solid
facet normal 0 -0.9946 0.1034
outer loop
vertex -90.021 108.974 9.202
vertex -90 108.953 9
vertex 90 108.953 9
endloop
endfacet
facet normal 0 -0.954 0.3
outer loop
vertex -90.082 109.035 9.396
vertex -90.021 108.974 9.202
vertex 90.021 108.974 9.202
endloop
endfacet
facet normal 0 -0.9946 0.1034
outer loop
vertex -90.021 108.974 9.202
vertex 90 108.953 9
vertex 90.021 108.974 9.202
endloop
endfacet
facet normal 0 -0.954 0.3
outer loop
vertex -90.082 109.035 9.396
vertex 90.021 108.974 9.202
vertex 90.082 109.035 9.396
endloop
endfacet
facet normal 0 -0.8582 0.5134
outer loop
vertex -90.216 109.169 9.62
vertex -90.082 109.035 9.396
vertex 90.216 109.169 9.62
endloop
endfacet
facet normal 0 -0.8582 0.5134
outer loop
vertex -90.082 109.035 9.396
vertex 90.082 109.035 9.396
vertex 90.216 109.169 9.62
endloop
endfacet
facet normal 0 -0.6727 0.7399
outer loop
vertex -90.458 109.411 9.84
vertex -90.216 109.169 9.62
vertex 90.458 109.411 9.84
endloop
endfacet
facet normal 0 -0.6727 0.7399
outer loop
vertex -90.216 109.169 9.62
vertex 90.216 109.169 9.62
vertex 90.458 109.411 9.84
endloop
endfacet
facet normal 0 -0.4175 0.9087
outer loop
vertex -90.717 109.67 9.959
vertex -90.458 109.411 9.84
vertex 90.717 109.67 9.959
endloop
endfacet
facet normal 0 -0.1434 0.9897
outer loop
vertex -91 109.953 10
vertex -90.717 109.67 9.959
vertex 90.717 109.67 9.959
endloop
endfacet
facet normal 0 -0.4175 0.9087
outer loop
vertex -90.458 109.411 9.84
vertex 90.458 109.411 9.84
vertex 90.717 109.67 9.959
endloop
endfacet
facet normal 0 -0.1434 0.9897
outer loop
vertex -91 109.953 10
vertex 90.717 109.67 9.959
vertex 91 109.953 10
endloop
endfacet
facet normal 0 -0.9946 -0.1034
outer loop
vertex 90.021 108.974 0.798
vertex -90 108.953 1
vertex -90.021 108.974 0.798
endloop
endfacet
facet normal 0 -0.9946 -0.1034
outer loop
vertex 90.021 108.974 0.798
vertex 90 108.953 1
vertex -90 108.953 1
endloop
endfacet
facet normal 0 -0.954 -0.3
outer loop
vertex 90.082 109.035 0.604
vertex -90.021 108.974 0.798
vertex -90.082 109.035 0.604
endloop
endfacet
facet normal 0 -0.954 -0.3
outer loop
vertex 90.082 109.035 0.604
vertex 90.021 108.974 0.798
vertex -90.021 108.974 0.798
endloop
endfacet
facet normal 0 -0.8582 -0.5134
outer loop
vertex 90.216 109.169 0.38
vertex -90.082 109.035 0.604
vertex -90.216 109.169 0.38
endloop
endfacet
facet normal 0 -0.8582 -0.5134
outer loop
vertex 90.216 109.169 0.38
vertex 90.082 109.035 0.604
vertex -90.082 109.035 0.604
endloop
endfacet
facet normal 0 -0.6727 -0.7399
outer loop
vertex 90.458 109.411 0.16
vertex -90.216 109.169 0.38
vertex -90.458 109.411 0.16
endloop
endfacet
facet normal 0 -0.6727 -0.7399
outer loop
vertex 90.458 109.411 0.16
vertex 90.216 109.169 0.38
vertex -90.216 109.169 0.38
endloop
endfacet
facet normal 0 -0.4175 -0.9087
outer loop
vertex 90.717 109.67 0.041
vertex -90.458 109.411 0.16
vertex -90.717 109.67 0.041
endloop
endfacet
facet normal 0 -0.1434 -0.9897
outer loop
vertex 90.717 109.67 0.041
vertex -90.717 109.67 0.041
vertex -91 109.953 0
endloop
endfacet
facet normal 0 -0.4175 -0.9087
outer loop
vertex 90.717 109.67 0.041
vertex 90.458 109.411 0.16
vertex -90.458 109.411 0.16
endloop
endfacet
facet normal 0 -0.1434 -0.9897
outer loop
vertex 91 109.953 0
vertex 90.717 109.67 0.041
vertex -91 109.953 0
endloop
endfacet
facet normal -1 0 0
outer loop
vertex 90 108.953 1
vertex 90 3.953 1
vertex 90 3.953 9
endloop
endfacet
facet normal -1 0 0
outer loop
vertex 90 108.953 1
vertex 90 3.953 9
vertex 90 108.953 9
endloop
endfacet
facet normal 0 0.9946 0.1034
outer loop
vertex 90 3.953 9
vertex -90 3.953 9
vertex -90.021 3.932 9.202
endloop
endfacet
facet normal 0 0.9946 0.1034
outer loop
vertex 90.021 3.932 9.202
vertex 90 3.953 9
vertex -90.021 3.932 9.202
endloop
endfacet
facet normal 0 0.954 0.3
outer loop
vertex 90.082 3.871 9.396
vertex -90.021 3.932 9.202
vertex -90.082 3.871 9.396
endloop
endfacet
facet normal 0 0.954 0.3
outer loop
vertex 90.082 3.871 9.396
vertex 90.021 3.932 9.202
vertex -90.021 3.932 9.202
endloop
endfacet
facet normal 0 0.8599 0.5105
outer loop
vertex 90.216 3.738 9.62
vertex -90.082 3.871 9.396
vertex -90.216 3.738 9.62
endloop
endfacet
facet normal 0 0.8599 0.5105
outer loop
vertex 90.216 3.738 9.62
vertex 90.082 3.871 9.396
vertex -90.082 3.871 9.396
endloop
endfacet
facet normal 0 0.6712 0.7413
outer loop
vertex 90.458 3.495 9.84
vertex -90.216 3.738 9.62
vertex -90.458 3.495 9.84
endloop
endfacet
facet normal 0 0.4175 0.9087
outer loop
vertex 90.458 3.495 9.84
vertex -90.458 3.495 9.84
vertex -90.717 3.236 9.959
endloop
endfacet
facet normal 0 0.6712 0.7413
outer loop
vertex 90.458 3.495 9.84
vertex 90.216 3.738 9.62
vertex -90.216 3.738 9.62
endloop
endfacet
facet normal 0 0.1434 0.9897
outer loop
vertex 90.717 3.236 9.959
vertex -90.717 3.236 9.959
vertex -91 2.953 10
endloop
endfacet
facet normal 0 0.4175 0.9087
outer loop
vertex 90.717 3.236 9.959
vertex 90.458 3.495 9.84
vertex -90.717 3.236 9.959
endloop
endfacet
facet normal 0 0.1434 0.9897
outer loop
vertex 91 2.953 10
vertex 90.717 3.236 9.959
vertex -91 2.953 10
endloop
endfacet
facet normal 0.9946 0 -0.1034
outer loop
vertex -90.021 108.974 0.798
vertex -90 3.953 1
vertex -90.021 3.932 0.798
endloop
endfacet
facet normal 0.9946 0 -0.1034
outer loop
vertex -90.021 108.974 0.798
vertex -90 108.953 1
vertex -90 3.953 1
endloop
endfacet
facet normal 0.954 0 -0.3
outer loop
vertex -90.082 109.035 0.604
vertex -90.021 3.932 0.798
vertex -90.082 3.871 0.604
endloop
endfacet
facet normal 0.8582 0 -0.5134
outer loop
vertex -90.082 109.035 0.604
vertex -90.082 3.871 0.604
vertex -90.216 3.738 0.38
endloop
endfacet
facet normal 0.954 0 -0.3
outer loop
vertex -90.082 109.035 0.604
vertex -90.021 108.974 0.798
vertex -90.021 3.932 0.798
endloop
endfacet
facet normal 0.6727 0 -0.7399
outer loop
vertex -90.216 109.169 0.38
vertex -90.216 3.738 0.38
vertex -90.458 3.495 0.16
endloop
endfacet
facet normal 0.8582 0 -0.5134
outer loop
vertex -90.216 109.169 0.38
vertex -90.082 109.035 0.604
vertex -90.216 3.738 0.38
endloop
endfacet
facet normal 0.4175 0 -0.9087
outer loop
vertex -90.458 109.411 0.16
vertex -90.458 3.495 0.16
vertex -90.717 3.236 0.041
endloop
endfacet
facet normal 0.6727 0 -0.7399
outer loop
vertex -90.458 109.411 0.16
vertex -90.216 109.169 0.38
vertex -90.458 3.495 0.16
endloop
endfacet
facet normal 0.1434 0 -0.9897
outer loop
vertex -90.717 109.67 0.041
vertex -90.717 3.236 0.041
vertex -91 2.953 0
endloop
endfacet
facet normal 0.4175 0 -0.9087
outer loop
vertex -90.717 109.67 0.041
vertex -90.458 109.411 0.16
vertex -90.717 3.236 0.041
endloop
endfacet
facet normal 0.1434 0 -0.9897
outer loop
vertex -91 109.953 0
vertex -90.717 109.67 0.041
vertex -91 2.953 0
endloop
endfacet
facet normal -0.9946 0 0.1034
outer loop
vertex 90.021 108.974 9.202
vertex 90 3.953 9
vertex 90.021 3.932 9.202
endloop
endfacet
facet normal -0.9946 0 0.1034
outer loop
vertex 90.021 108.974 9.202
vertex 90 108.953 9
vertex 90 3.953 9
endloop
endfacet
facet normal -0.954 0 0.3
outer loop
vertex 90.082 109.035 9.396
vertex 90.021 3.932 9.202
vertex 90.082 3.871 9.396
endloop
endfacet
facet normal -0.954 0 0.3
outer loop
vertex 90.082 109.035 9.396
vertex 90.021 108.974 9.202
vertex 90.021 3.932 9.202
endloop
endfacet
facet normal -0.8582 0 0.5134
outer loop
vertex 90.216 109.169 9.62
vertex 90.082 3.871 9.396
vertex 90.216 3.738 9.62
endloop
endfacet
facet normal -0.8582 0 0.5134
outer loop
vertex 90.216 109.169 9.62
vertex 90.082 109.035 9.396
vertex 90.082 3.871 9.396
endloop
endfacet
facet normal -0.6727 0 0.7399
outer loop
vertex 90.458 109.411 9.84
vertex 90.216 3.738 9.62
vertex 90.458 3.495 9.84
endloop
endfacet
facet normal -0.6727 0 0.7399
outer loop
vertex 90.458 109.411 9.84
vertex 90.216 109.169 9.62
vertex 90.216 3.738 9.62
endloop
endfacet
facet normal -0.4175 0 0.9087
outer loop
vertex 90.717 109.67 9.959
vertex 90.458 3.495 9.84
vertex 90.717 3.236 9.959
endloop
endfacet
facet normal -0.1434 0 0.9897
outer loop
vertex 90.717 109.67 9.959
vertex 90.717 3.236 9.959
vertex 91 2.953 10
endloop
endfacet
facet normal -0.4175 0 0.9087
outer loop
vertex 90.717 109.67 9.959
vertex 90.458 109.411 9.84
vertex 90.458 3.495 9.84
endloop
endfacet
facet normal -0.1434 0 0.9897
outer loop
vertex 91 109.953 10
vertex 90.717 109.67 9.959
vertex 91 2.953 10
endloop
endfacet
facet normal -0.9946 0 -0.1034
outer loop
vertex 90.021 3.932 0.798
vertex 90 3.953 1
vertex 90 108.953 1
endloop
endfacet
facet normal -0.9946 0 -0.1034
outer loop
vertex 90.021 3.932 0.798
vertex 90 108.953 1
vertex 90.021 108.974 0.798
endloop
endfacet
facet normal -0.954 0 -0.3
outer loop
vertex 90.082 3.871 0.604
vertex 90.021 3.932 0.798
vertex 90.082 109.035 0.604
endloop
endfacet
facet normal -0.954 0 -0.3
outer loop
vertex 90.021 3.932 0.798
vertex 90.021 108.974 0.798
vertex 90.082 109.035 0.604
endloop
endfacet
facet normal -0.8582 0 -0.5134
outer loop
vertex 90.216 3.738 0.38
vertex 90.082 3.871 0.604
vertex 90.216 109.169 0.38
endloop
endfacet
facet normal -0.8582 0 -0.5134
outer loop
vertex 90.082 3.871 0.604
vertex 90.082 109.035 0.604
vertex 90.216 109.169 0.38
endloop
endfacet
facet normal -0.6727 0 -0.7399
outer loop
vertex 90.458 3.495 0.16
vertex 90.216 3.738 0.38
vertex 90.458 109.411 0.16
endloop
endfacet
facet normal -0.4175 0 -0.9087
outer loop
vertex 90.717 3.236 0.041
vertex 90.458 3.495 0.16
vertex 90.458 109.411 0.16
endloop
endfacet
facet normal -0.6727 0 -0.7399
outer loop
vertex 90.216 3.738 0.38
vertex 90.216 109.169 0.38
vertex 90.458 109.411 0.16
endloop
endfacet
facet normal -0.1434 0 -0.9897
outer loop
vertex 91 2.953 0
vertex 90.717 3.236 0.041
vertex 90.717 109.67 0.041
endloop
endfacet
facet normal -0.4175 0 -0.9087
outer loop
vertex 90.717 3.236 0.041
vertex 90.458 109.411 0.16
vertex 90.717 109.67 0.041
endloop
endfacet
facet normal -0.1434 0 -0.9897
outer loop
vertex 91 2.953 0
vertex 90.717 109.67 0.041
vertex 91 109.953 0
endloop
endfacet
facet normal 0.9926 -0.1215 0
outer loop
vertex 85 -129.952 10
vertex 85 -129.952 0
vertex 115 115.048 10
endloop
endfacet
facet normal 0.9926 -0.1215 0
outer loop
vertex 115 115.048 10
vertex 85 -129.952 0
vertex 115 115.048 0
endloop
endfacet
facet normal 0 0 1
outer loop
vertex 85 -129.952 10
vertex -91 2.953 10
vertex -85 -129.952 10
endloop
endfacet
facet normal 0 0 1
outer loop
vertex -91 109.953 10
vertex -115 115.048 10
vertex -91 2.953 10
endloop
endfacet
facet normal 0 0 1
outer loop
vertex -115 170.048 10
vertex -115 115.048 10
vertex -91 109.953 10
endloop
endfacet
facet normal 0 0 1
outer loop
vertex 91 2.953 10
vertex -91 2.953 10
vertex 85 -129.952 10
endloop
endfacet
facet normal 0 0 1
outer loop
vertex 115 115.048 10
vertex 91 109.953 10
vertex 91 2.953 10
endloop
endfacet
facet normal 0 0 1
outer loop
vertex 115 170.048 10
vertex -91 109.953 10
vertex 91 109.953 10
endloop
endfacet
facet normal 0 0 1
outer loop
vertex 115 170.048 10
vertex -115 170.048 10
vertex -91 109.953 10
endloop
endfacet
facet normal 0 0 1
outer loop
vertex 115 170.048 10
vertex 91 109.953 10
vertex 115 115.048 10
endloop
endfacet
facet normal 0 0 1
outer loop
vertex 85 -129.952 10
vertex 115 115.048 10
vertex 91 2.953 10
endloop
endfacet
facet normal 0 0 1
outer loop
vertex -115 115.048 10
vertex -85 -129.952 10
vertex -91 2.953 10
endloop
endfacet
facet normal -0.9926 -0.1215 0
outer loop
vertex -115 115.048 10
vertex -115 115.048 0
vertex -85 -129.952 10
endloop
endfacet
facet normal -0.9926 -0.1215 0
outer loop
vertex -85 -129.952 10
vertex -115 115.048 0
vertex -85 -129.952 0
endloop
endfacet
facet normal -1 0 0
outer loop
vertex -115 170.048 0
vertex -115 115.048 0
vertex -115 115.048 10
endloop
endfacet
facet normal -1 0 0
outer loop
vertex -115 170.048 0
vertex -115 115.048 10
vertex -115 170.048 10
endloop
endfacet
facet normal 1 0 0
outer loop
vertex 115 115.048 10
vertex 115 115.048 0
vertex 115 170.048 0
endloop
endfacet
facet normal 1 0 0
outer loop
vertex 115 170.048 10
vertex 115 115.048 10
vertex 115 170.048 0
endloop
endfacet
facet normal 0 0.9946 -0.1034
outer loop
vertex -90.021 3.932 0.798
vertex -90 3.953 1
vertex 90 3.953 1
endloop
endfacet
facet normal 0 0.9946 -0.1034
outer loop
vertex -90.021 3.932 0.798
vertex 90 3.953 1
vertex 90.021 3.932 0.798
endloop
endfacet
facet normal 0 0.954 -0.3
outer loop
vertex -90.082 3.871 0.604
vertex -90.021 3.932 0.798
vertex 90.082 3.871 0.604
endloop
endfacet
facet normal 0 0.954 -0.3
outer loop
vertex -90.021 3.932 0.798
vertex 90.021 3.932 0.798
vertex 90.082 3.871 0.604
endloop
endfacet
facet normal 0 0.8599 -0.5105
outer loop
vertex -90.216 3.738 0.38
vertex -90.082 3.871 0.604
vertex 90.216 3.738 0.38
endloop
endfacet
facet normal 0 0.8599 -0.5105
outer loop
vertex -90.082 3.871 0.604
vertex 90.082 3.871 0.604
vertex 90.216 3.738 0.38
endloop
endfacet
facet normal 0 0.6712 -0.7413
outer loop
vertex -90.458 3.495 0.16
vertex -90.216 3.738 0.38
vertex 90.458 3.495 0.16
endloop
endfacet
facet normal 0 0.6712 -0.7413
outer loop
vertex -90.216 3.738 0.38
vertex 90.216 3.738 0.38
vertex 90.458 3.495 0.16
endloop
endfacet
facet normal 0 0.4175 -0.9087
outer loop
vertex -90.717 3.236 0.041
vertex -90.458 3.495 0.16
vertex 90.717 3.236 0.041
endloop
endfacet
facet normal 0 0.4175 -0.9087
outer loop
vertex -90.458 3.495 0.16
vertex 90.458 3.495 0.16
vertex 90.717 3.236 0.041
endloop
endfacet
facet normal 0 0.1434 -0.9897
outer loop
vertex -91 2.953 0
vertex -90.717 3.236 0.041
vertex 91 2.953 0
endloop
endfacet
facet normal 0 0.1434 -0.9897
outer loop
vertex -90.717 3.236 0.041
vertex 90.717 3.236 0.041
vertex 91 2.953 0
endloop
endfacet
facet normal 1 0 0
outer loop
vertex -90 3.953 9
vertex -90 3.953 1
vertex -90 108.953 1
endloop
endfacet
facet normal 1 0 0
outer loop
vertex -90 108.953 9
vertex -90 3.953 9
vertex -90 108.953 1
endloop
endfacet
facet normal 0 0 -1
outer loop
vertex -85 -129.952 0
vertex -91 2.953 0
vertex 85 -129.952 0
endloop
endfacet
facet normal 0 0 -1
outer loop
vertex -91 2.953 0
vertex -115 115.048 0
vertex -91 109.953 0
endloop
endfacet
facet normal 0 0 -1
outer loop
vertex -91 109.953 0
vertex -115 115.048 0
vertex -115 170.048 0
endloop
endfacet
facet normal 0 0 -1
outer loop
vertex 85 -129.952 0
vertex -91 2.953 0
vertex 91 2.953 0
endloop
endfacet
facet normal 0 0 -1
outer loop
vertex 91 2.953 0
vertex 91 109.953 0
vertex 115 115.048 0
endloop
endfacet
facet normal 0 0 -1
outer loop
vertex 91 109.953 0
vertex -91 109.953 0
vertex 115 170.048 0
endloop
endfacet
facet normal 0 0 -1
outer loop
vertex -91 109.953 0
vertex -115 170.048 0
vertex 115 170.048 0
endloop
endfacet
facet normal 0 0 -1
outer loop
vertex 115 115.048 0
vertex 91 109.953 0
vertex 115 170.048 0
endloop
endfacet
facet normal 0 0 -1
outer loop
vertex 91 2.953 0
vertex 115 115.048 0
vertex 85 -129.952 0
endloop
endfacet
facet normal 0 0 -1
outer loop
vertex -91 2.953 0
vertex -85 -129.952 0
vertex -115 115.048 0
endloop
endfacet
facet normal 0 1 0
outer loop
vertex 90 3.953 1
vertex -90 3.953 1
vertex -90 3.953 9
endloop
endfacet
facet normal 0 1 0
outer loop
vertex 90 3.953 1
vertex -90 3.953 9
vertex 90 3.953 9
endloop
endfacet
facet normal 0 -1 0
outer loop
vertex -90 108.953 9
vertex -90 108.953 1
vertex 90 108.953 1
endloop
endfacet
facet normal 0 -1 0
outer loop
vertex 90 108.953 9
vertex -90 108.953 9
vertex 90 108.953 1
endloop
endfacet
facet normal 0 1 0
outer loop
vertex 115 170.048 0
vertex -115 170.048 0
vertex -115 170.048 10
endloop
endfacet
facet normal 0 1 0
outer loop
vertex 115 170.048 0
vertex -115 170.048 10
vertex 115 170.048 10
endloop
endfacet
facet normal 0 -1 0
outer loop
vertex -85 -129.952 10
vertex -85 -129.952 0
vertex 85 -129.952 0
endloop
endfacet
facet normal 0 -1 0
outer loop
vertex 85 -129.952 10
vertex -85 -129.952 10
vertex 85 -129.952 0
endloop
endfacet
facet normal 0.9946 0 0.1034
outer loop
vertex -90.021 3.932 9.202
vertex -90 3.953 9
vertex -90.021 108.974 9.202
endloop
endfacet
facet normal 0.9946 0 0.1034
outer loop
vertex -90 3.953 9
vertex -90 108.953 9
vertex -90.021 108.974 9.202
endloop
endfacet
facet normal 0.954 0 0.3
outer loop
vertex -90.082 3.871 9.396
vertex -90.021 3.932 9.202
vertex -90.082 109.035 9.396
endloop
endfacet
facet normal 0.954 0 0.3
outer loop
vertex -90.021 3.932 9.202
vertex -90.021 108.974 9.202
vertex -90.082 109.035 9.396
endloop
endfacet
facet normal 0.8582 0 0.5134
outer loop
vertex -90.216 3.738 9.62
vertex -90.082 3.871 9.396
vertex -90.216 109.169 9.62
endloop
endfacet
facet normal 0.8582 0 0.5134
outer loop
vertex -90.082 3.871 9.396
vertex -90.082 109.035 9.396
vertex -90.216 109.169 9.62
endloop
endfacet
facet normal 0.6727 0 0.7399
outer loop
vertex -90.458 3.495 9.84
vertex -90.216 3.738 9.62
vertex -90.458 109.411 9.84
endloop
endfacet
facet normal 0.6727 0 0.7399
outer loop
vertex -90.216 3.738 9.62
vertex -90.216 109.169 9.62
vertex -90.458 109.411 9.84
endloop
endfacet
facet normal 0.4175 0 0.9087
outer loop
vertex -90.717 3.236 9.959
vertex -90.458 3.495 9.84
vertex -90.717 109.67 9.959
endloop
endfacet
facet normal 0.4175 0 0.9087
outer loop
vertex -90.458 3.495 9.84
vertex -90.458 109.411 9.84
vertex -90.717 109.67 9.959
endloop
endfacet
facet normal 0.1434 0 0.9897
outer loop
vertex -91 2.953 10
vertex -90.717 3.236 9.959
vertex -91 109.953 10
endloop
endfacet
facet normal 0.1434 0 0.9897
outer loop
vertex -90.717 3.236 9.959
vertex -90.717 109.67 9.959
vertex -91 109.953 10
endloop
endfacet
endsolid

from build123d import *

# Parameters (mm, degrees)
F0_W     = 180
F0_H     = 105
F0_W_2   = 230
F0_H_2   = 55
F0_W_3   = 170
F0_H_3   = 20
F1_DEPTH = 10
F2_R     = 1


with BuildPart() as f1:
    # F0 (on Top) → F1 (new body)
    with BuildSketch(Plane.XY):
        Polygon((85, -129.952139), (115, 115.047861), (-115, 115.047861), (-85, -129.952139), (-85, -109.952139), (85, -109.952139), align=None)
        with Locations((0, 56.453109)):
            Rectangle(F0_W, F0_H, mode=Mode.SUBTRACT)
        with Locations((0, 142.547861)):
            Rectangle(F0_W_2, F0_H_2)
        with Locations((0, -119.952139)):
            Rectangle(F0_W_3, F0_H_3)
    extrude(amount=F1_DEPTH)

    # F2
    f2_edges = [f1.edges().sort_by_distance(p)[0] for p in [
        (0, 108.953109, 0),
        (90, 56.453109, 10),
        (0, 3.953109, 10),
        (-90, 56.453109, 10),
        (0, 3.953109, 0),
        (-90, 56.453109, 0),
        (0, 108.953109, 10),
        (90, 56.453109, 0),
    ]]
    fillet(f2_edges, radius=F2_R)


solid = f1.part
